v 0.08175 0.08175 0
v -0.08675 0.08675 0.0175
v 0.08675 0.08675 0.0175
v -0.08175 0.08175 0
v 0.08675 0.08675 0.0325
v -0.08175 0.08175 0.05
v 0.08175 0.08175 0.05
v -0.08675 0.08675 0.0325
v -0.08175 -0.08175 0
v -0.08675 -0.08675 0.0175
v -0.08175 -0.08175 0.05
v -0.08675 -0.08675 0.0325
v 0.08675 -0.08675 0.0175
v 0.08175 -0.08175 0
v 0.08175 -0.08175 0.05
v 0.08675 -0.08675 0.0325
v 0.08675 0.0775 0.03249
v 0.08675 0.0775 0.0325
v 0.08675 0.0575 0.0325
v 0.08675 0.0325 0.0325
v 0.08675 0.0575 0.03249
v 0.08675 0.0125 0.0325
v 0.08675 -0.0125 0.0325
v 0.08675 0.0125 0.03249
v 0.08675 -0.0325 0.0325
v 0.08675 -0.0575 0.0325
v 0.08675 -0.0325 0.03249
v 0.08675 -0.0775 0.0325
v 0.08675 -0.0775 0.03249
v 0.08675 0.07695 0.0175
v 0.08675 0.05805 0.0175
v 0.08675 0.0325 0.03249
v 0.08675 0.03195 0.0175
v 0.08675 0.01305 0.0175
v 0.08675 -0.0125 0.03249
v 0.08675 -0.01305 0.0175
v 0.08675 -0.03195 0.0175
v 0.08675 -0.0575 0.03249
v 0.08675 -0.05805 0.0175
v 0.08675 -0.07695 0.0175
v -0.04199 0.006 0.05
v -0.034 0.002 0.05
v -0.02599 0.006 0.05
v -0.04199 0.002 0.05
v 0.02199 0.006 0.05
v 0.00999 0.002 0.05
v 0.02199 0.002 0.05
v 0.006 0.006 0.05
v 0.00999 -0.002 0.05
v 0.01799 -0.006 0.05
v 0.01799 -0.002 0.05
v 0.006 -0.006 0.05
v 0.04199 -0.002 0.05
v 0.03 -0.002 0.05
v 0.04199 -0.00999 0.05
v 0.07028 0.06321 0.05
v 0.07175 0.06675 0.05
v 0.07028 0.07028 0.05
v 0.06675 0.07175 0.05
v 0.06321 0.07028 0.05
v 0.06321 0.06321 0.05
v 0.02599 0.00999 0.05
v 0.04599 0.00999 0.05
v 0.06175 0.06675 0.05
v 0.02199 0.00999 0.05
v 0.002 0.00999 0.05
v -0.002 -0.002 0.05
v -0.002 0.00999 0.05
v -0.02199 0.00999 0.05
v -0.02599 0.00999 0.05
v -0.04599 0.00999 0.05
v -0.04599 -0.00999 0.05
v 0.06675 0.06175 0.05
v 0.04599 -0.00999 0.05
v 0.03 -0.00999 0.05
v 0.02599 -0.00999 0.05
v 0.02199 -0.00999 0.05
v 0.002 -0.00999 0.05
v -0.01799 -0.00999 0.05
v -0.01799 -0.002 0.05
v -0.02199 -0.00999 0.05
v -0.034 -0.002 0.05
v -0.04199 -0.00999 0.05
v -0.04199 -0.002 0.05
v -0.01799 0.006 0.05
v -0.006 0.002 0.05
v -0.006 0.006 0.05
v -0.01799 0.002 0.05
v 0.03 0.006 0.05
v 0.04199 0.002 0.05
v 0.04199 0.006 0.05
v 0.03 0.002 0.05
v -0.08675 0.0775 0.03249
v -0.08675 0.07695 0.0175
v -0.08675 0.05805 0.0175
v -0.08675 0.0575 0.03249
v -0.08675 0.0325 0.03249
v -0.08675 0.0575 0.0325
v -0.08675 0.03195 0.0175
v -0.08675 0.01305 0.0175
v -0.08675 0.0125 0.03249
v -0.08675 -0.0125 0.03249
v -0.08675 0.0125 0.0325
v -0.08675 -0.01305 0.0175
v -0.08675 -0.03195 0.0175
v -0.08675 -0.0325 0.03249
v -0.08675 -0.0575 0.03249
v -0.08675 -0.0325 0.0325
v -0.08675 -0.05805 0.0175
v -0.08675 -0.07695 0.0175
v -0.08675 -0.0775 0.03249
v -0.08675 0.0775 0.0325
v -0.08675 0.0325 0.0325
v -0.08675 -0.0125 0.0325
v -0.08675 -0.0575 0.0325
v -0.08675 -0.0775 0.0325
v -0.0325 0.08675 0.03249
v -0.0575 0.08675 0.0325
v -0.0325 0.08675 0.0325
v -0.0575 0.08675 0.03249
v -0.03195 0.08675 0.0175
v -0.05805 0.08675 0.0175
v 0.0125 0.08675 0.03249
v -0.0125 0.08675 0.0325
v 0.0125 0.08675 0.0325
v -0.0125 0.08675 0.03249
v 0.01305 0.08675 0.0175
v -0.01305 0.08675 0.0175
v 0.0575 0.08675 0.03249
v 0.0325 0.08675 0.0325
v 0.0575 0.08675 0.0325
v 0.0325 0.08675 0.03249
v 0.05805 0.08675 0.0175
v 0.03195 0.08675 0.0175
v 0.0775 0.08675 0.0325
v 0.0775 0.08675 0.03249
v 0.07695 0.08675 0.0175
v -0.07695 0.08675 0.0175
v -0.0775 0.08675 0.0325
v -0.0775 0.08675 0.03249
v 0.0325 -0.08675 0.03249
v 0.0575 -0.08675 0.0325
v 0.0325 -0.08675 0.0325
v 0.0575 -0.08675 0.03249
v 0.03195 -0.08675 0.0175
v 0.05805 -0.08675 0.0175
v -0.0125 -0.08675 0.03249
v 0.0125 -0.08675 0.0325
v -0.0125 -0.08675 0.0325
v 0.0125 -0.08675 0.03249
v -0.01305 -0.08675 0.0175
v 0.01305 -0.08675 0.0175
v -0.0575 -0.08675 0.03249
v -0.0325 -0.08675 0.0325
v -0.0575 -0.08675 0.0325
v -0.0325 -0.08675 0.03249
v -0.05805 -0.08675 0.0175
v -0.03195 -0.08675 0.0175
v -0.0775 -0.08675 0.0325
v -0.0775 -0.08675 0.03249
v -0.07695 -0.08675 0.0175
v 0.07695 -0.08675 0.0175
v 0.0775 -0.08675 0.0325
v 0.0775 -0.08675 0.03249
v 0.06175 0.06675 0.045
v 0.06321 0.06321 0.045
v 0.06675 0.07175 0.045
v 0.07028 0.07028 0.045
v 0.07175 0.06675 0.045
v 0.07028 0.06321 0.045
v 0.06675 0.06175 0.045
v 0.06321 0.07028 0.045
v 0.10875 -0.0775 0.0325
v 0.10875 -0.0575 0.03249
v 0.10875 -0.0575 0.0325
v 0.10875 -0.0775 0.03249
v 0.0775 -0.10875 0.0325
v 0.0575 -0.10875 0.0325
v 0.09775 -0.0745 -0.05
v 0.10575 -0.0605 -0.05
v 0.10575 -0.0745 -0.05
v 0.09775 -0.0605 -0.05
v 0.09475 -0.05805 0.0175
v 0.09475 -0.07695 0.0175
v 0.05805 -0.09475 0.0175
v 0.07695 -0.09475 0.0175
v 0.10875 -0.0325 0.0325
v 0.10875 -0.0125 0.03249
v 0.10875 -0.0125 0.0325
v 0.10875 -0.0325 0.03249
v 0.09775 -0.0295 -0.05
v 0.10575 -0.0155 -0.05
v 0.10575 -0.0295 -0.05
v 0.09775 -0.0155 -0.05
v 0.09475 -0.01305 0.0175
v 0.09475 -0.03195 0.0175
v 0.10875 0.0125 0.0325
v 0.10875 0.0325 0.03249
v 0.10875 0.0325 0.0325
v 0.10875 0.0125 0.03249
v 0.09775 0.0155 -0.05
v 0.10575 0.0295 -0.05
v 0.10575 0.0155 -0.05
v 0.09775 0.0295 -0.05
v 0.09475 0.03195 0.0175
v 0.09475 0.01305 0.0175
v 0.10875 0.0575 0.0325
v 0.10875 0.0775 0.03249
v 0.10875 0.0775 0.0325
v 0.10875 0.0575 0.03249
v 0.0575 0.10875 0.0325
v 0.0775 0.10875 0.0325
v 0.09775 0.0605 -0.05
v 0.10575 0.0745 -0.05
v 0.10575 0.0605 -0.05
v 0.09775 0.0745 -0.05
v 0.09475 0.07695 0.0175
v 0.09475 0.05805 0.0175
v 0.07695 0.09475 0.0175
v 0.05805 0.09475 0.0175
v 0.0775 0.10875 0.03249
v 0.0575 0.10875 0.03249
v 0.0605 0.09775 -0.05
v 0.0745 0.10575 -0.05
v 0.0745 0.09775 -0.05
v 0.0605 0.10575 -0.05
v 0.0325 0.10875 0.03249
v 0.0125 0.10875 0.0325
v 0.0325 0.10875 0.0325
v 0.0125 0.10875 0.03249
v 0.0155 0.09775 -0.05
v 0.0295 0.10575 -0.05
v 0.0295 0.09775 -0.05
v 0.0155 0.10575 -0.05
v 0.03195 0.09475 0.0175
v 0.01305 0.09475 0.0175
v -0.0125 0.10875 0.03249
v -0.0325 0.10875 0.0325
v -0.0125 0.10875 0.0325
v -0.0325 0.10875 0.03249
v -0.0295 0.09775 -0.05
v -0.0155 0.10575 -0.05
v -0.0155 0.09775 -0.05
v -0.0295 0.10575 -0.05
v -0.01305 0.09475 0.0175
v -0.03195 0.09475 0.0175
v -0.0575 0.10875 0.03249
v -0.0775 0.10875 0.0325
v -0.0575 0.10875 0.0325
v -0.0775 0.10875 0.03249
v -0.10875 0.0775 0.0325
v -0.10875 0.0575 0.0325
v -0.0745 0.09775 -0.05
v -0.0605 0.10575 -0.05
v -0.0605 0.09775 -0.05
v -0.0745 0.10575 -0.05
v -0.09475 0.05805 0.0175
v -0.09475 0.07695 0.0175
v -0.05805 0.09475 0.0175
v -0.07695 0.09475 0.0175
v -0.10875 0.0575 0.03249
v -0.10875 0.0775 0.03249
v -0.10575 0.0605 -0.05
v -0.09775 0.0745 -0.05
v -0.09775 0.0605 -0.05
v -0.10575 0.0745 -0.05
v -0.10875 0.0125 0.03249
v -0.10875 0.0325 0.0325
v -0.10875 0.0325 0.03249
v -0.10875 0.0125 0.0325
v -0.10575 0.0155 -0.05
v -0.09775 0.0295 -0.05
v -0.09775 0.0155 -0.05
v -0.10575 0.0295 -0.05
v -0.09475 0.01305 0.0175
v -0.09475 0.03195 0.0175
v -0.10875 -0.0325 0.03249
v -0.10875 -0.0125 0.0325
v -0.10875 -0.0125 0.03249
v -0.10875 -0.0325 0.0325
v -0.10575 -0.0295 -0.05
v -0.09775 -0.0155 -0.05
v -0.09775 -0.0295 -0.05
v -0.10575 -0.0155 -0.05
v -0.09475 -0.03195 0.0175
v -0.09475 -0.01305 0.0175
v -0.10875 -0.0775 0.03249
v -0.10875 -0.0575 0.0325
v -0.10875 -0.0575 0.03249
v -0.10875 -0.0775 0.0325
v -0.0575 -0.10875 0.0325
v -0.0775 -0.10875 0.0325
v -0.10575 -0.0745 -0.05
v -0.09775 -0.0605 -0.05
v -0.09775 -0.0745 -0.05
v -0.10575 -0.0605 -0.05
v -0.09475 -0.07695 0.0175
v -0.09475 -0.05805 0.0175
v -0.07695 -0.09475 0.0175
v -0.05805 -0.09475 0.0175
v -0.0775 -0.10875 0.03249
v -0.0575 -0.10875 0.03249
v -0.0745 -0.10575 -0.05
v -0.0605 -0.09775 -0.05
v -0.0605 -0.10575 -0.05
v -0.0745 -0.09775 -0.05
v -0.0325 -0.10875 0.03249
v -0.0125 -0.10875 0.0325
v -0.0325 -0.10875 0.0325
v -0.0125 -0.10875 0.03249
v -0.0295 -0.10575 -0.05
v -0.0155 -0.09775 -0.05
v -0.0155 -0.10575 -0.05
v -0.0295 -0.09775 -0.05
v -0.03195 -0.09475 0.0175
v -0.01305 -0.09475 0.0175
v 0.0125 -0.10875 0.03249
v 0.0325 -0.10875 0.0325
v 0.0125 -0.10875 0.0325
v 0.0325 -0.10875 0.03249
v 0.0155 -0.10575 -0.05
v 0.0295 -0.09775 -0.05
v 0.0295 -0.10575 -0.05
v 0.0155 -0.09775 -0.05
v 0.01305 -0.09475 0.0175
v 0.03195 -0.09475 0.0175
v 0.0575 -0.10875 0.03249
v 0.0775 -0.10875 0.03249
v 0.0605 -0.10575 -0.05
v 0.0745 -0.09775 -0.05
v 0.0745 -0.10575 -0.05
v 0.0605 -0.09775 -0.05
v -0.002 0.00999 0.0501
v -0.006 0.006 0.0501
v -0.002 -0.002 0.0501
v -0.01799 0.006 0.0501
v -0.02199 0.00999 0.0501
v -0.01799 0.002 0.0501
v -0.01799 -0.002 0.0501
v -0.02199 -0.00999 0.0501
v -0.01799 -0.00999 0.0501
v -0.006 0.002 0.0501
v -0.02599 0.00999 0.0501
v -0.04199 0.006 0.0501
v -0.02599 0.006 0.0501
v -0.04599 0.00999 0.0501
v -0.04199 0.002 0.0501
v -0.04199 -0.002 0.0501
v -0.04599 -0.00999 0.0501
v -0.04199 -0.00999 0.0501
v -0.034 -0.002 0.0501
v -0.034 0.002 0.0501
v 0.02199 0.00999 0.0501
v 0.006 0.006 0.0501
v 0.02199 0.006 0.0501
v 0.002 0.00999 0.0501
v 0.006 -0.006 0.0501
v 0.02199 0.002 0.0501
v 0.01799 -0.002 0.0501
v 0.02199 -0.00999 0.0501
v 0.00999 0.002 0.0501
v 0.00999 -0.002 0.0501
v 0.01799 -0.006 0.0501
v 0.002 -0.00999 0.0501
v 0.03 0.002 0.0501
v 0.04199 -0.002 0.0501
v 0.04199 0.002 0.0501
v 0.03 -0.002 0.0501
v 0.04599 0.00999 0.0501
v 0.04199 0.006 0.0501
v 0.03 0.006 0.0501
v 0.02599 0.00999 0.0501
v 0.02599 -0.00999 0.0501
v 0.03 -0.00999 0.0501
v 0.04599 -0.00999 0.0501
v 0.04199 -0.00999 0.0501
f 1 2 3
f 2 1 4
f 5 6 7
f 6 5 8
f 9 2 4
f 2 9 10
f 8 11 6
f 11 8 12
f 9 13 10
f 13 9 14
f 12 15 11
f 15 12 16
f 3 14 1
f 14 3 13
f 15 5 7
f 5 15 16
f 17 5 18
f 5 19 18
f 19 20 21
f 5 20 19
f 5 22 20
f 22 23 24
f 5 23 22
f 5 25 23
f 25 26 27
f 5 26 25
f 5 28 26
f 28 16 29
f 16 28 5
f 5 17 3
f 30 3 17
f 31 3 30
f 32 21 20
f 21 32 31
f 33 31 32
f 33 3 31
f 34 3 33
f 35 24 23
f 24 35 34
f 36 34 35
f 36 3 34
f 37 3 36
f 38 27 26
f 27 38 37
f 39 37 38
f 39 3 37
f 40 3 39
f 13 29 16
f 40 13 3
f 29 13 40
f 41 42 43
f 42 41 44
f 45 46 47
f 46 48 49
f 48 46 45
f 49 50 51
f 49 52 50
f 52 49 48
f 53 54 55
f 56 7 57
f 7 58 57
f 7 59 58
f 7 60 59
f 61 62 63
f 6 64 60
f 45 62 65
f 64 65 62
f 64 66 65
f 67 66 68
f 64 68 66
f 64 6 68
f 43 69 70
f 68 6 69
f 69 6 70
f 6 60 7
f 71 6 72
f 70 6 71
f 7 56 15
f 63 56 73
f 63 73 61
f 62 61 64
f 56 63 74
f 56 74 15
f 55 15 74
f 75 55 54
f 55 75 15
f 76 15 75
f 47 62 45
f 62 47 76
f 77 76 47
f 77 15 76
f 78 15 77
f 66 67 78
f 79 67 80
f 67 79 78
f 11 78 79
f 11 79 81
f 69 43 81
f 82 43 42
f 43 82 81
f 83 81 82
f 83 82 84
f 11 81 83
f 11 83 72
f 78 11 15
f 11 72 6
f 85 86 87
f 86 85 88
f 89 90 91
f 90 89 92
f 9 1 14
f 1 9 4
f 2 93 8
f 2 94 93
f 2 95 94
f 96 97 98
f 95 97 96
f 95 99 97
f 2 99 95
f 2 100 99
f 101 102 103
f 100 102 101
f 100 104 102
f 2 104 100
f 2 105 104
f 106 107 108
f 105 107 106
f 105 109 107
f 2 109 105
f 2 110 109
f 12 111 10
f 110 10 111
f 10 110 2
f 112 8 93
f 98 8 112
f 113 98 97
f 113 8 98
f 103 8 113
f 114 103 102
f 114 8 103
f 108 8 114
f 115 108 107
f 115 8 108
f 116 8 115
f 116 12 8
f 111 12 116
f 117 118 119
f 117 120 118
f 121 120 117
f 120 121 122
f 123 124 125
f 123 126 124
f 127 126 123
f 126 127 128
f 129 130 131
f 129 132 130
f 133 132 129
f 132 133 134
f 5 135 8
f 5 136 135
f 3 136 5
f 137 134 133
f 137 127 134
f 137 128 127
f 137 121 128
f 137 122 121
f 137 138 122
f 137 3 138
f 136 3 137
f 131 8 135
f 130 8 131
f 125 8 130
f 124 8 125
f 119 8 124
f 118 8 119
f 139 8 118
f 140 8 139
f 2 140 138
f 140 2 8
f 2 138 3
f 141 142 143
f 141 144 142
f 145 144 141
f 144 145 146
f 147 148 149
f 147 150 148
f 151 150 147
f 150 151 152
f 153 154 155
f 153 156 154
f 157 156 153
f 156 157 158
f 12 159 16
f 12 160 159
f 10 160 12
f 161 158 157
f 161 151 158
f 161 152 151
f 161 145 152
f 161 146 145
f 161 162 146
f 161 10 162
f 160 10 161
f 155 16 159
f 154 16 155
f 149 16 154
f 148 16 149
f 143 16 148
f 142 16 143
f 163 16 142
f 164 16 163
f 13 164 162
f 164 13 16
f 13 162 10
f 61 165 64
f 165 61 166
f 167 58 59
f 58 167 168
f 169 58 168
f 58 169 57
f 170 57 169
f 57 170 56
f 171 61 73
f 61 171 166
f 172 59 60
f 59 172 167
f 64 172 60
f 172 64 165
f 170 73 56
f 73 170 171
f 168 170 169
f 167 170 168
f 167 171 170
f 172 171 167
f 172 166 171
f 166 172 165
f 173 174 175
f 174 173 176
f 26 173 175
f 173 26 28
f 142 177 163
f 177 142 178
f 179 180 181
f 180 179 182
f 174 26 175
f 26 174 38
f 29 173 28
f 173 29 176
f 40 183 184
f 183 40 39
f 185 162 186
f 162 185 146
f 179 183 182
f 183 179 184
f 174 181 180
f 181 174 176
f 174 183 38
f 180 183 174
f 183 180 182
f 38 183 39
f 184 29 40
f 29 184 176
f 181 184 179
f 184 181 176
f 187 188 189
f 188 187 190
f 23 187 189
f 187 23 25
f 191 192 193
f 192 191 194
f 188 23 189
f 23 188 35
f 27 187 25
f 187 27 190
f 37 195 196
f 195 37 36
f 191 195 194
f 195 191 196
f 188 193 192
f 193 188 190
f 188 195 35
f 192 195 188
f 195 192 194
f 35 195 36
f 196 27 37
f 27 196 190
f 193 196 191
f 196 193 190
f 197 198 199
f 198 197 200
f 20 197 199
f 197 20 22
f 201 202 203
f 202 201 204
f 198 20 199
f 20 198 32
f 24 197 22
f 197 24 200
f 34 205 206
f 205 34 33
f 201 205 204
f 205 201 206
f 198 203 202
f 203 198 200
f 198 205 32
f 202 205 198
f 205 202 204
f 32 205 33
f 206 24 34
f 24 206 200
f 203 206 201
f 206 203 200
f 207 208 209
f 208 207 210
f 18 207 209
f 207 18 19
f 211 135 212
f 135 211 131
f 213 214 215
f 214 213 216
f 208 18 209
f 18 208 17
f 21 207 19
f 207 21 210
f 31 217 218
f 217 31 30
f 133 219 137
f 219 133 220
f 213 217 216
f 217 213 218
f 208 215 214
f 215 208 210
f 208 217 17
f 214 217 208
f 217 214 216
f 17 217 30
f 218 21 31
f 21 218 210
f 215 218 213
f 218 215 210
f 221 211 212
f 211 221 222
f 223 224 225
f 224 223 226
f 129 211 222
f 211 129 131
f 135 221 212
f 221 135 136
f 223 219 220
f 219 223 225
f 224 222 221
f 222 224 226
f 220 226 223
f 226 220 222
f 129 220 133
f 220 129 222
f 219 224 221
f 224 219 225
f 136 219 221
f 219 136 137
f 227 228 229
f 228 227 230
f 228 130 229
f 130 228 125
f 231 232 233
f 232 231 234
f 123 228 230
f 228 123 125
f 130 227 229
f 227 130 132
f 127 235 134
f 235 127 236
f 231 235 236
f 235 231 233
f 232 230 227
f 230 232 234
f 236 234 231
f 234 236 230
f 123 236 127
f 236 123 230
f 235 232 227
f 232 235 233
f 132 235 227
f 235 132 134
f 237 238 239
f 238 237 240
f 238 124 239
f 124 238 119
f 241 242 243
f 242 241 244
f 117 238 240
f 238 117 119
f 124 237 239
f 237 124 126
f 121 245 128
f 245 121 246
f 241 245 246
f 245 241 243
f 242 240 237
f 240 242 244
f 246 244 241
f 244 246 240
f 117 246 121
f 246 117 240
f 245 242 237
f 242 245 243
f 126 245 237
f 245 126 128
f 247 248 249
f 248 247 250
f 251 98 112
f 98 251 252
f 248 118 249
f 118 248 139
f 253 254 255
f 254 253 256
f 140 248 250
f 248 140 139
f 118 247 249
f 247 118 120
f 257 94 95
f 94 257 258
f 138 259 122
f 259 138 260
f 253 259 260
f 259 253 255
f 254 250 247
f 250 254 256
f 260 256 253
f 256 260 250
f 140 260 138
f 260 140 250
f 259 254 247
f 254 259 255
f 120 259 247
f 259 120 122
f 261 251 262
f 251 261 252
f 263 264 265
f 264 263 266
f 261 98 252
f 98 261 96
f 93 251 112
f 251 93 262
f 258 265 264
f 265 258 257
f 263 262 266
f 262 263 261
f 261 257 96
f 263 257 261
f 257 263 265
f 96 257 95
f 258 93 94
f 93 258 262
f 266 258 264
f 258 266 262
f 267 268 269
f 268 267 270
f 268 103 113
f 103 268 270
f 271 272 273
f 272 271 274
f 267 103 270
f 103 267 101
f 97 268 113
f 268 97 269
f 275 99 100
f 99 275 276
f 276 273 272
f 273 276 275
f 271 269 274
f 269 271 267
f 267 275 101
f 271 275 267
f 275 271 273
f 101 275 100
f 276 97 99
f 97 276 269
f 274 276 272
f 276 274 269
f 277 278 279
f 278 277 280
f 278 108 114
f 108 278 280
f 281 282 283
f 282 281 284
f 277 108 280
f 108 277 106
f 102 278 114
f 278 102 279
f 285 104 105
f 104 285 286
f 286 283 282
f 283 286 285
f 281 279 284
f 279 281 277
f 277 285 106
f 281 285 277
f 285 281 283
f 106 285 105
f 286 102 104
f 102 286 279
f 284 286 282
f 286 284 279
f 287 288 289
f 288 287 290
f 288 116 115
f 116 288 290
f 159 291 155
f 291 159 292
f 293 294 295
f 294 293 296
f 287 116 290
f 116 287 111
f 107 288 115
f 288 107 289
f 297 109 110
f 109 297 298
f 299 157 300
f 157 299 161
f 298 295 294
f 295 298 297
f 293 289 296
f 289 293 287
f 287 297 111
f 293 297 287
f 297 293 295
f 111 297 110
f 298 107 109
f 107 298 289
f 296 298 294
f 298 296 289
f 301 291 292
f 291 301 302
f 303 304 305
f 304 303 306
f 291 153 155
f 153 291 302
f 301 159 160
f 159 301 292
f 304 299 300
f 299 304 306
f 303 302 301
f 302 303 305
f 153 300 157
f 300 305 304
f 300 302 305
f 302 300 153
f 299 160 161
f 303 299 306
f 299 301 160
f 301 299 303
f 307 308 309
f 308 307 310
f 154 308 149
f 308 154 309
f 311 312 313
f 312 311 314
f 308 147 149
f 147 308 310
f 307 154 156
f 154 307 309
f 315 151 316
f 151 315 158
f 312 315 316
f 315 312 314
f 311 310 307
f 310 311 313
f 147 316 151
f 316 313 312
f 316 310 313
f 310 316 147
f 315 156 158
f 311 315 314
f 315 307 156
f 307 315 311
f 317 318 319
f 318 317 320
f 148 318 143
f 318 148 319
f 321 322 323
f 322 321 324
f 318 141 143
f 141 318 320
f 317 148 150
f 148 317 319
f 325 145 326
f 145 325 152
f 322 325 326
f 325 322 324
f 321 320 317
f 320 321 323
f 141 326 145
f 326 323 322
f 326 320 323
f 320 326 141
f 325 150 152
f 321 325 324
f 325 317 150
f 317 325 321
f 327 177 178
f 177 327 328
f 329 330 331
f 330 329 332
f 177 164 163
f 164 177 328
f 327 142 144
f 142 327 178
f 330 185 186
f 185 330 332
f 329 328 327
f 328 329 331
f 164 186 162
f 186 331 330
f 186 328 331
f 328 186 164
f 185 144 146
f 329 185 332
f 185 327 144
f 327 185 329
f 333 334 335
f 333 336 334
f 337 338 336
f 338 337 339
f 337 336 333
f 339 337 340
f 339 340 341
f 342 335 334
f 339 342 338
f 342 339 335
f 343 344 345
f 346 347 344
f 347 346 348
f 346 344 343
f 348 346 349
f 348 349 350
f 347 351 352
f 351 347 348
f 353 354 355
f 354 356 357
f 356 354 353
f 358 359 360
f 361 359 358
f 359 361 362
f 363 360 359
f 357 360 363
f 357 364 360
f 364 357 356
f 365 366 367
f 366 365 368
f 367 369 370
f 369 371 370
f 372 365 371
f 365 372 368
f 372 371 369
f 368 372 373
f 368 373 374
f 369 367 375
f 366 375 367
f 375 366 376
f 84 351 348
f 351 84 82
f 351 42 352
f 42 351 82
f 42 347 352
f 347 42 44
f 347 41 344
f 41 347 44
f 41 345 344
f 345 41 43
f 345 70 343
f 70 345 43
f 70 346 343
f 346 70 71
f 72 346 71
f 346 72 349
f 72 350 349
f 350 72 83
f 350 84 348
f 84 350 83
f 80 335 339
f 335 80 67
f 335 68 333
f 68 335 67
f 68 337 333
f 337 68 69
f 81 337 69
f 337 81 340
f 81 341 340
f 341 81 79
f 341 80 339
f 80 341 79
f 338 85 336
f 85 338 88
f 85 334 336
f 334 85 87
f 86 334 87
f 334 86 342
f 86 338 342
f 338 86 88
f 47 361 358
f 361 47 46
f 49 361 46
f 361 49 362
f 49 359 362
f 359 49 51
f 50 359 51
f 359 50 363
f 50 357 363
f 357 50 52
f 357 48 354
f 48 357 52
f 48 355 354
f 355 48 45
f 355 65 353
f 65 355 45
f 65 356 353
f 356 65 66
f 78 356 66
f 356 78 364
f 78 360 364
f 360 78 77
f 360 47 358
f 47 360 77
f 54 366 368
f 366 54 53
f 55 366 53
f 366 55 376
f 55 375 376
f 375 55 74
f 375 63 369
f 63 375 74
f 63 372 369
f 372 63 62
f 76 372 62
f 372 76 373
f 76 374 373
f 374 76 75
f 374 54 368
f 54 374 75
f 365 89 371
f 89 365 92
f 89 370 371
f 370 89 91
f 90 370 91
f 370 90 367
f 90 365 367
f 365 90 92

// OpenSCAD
// file: Text_FPGALOGIC.scad
include <Text_shared.scad>;

module Text_FPGALOGIC() {
  Text("FPGA LOGIC");
}

Text_FPGALOGIC();
// file: DataSymbol.scad
boxSize = 0.029;
lineSize = 0.0045;
symDepth = 0.01;
vertSeparation = 0.019;
horizSeparation = 0.018;

module DataSymbol() {
  boxVertCenter = (boxSize+vertSeparation)/2;
  boxHorizCenter = (boxSize+horizSeparation)/2;
  linear_extrude(symDepth, center=true) {
    translate([0,boxVertCenter]) square(boxSize, center=true); // top box
    translate([-boxHorizCenter,-boxVertCenter]) square(boxSize, center=true); // bottom left box
    translate([boxHorizCenter,-boxVertCenter]) square(boxSize, center=true); // bottom right box
    square([2*boxHorizCenter + lineSize, lineSize], center=true); // middle line
    translate([0, horizSeparation/4]) square([lineSize, horizSeparation/2 + lineSize], center=true); // line to top
    translate([-boxHorizCenter, -horizSeparation/4]) square([lineSize, horizSeparation/2 + lineSize], center=true); // line to bottom left
    translate([boxHorizCenter, -horizSeparation/4]) square([lineSize, horizSeparation/2 + lineSize], center=true); // line to bottom right
  }
}

DataSymbol();
// file: PowerSymbol.scad
symWidth = 0.038;
symHeight = 0.086;
symDepth = 0.01;
middleHeight = 0.0075;
topHorizOffset = 0.007;
sideVertOffset = 0.007;

module PowerSymbol() {
  linear_extrude(symDepth, center=true) {
    halfHei = symHeight/2;
    halfWid = symWidth/2;
    halfMid = middleHeight/2;
    polygon([
      [topHorizOffset, halfHei],
      [0, halfMid],
      [halfWid, sideVertOffset],
      [-topHorizOffset, -halfHei],
      [0, -halfMid],
      [-halfWid, -sideVertOffset]
    ]);
  }
}

PowerSymbol();
// file: BasicFPGAHousing_pins.scad
include <FPGA_shared.scad>;
use <BasicFPGAHousing_base.scad>;
use <BasicFPGAHousing_paintcap.scad>;

module BasicFPGAHousing_pins() {
  pinStartOffset = -(decoPinCount+1)/2 * decoPinSpacing;
  bevelSize = decoPinBevelSize * sqrt(2);

  for (edge=[0:3]) rotate([0,0,90*edge]) {
    for (pin=[1:decoPinCount]) translate([capSize/2, pinStartOffset+pin*decoPinSpacing, baseTop]) {
      difference() {
        cube(size=[decoPinLength*2, decoPinWidth, decoPinHeight*2], center=true);
        translate([decoPinLength,0,decoPinHeight]) rotate([0,45,0]) {
          cube(size=[bevelSize,decoPinWidth*2,bevelSize],center=true);
        }
      }
    }
  }
}

BasicFPGAHousing_pins();
%BasicFPGAHousing_base();
%BasicFPGAHousing_paintcap();
// file: BasicFPGAHousing_paintcap.scad
include <FPGA_shared.scad>;
use <BasicFPGAHousing_base.scad>;

module BasicFPGAHousing_paintcap() {
  bevelDepth = capBevel * sqrt(2);
  difference() {
    translate([0,0,baseTop]) {
      cube(size=[capSize, capSize, capDepth*2], center=true);
    }
    cube(size=[slotSize+eps, slotSize+eps, smallGridSize], center=true);
    for (edge=[1:4]) rotate([0,0,90*edge]) {
      translate([0,capSize/2,baseTop+capDepth]) rotate([45,0,0])
        cube(size=[capSize+0.1, bevelDepth, bevelDepth*2], center=true);
    }
  }
}

%BasicFPGAHousing_base();
BasicFPGAHousing_paintcap();
// file: BasicFPGAHousing_base.scad
include <FPGA_shared.scad>;
use <BasicFPGAHousing_paintcap.scad>;
use <PowerSymbol.scad>;
use <DataSymbol.scad>;

module BasicFPGAHousing_chipcutout() {
  slotPinBaseOffset = (-slotPinEdgeCount-1)/2 * slotPinEdgeSpacing;
  slotPinEdgeOffset = slotSize/2 - slotPinSize/2 - slotPinEdgePad;
  union() {
    translate([0, 0, baseDepth/2 + slotBottom + slotPinDepth]) {
      cube(size=[slotSize, slotSize, baseDepth], center=true);
    }
    for(edge=[1:4]) rotate([0,0,90*edge]) {
      for(i=[1:slotPinEdgeCount]) {
        translate([
          slotPinBaseOffset + slotPinEdgeSpacing*i,
          slotPinEdgeOffset,
          slotBottom + slotPinDepth
        ]) {
          cube(size=[slotPinSize, slotPinSize, slotPinDepth*2], center=true);
        }
      }
    }
    translate([alignHoleOffset,alignHoleOffset,slotBottom + slotPinDepth])
      cylinder(h=alignHoleDepth*2, r=alignHoleRadius, center=true, $fn=alignHoleSides);
  }
}

module BasicFPGAHousing_base() {
  middleSize = (slotSize + capSize) / 2;
  difference() {
    union() {
      translate([0,0,baseCenter])
        cube(size=[baseSize, baseSize, baseDepth], center=true);
      translate([0,0,baseTop-eps])
        cube(size=[middleSize, middleSize, capDepth*2], center=true);
    }
    translate([0,0,baseBottom])
      cube(size=[baseBackCutoutSize, baseBackCutoutSize, baseBackCutoutDepth*2], center=true);
    BasicFPGAHousing_chipcutout();
  }
}

BasicFPGAHousing_base();
%BasicFPGAHousing_paintcap();
// file: Text_shared.scad
char_depth = 0.0001;

char_pixelsz = 0.02/5;
char_pheight = 5;
char_max_pwidth = 5;

function sum(list) = list * [for (_=list) 1];
function partialsum(list, end) = list * [for (i=[0:len(list)-1]) i < end ? 1 : 0];

module _Text_Line(a, b) {
  l = norm(b-a);
  f = l > 0 ? (b-a)/l : [1, 0];
  r = [f.y, -f.x];
  ea = -0.5*f;
  eb = (l+0.5)*f;
  sr = 0.5*r;
  sl = -sr;
  polygon([
    a+ea+sr,
    a+eb+sr,
    a+eb+sl,
    a+ea+sl,
  ]*char_pixelsz);
}

module _Text_Segments(pts, off=[0,0]) {
  for (i=[0:len(pts)-2]) {
    pa = pts[i];
    pb = pts[i+1];
    if (len(pa) == 2 && len(pb) == 2)
      _Text_Line(pts[i]+off, pts[i+1]+off);
  }
}

_Letters = [
  [[-2, -2], [-2, 2], [2, 2], [2, -2], [2, 0], [-2, 0]], // A
  [], // B
  [[2, -2], [-2, -2], [-2, 2], [2, 2]], // C
  [[2, 0.5], [2, -2], [-2, -2], [-2, 2], [0.5, 2], [], [3, 0], [0, 3]], // D
  [[2, -2], [-2, -2], [-2, 2], [2, 2], [], [-2, 0], [0, 0]], // E
  [[2, 2], [-2, 2], [-2, -2], [-2, 0], [0, 0]], // F
  [[0, 0], [2, 0], [2, -2], [-2, -2], [-2, 2], [2, 2]], // G
  [], // H
  [[0, -2], [0, 2]], // I
  [], // J
  [], // K
  [[-2, 2], [-2, -2], [2, -2]], // L
  [], // M
  [], // N
  [[-2, -2], [-2, 2], [2, 2], [2, -2], [-2, -2]], // O
  [[-2, -2], [-2, 2], [2, 2], [2, 0], [-2, 0]], // P
  [], // Q
  [[-2, -2], [-2, 2], [2, 2], [2, 0], [-2, 0], [1, -3]], // R
  [], // S
  [], // T
  [], // U
  [], // V
  [], // W
  [], // X
  [], // Y
  [], // Z
  [[-2, 2], [2, 2], [2, 0], [0, 0], [], [0, -2], [0, -2]], // ? for missing
];

function _Letter_Lookup(c) =
  let(
    ci=ord(c),
    li=ci-ord("A"),
    issp=ci==32,
    lps=li>=0&&li<26 ? _Letters[li] : [],
    lpf=len(lps)==0 ? _Letters[26] : lps
  ) issp ? [] : lpf;

function _Letter_Bounds(letter) =
  let(
    fletter = concat([[0, 0]], [for (l=letter) len(l)==2 ? l : [0,0]]),
    xs = [for (l=fletter) l.x],
    ys = [for (l=fletter) l.y]
  ) [min(xs), min(ys), max(xs), max(ys)];

module Text(letters) {
  lbounds = [for (l=letters) _Letter_Bounds(l)];
  lwidths = [for (b=lbounds) min(b.z-b.x+1, char_max_pwidth)];
  lmins = [for (b=lbounds) b.x];
  twid = sum(lwidths) + len(letters)-1;
  startoff = (1-twid)/2;
  offs = [for (i=[0:len(letters)-1]) startoff+i+partialsum(lwidths, i)];
  linear_extrude(height=char_depth) {
    for (i=[0:len(letters)-1]) if (len(letters[i]) > 0) {
      letter = letters[i];
      off = offs[i];
      left = off-lmins[i];
      wid = lwidths[i];
      intersection() {
        _Text_Segments(letter, [left, 0]);
        scale([char_pixelsz,char_pixelsz]) translate([off-0.5, -char_pheight/2])
          square(size=[wid, char_pheight]);
      }
    }
  }
}

module Text(text) {
  letters = [for (c=text) _Letter_Lookup(c)];
  lbounds = [for (l=letters) _Letter_Bounds(l)];
  lwidths = [for (b=lbounds) min(b.z-b.x+1, char_max_pwidth)];
  lmins = [for (b=lbounds) b.x];
  twid = sum(lwidths) + len(letters)-1;
  startoff = (1-twid)/2;
  offs = [for (i=[0:len(letters)-1]) startoff+i+partialsum(lwidths, i)];
  linear_extrude(height=char_depth) {
    for (i=[0:len(letters)-1]) if (len(letters[i]) > 0) {
      letter = letters[i];
      off = offs[i];
      left = off-lmins[i];
      wid = lwidths[i];
      intersection() {
        _Text_Segments(letter, [left, 0]);
        scale([char_pixelsz,char_pixelsz]) translate([off-0.5, -char_pheight/2])
          square(size=[wid, char_pheight]);
      }
    }
  }
}
// file: BasicFPGAHousing_full.scad
use <BasicFPGAHousing_base.scad>;
use <BasicFPGAHousing_paintcap.scad>;
use <BasicFPGAHousing_pins.scad>;
use <PowerSymbol.scad>;
use <DataSymbol.scad>;
use <Text_FPGALOGIC.scad>;

module BasicFPGAHousing_full() {
  color("#444") BasicFPGAHousing_base();
  color("#444") BasicFPGAHousing_paintcap();
  color("#FFF") BasicFPGAHousing_pins();
  color("#F00") translate([0.067,0.25,-0.001]) rotate([-90, 0, 0]) PowerSymbol();
  color("#0F0") translate([0.073,-0.25,0.001]) rotate([90, 0, 0]) DataSymbol();
  color("#FFF") translate([0,0.16,0.095]) Text_FPGALOGIC();
}

BasicFPGAHousing_full();
// file: Text_FPGA.scad
include <Text_shared.scad>;

module Text_FPGA() {
  Text("FPGA");
}

Text_FPGA();
// file: BasicFPGAChip_pins.scad
include <FPGA_shared.scad>;
use <BasicFPGAChip_base.scad>;

module FPGAPin() {
  pinTop = chipTotalHeight/2 - chipBaseHeight/2 + pinHorizHeight/2;
  pinVCenter = pinTop - pinTotalHeight/2;
  pinBottomInnerEdge = pinHorizUnderLength + pinVertInnerOffset;
  pinInnerHeight = pinTotalHeight - pinHorizHeight;
  pinInnerAngle = atan2(-pinVertInnerOffset, pinInnerHeight);
  pinInnerCutoutHeight = pinInnerHeight / cos(pinInnerAngle);
  pinBottomOuterEdge = pinHorizLength - pinVertOuterOffset;
  pinOuterAngle = atan2(pinVertOuterOffset, pinTotalHeight);
  pinBottomNarrowEdge = pinHorizWidth/2 - pinVertNarrowOffset;
  pinNarrowAngle = atan2(pinVertNarrowOffset, pinTotalHeight);
  translate([0,0,pinVCenter]) difference() {
    translate([0, 0, 0])
      cube(size=[pinHorizLength*2, pinHorizWidth, pinTotalHeight], center=true);
    translate([pinHorizUnderLength-pinHorizLength, 0, -pinHorizHeight])
      cube(size=[pinHorizLength*2, pinHorizWidth*2, pinTotalHeight], center=true);
    translate([pinBottomInnerEdge,0,-pinHorizHeight/2-pinInnerHeight/2])
      rotate([0,pinInnerAngle,0])
      translate([-pinVertInnerOffset,0,0])
        cube(size=[pinVertInnerOffset*2, pinHorizWidth*2, pinInnerCutoutHeight*2], center=true);
    translate([pinBottomOuterEdge,0,-pinTotalHeight/2])
      rotate([0,pinOuterAngle,0])
      translate([pinVertOuterOffset,0,0])
        cube(size=[pinVertOuterOffset*2, pinHorizWidth*2, pinTotalHeight*4], center=true);
    translate([0,pinBottomNarrowEdge,-pinTotalHeight/2])
      rotate([-pinNarrowAngle,0,0])
      translate([0,pinVertNarrowOffset,0])
        cube(size=[pinHorizLength*4,pinVertNarrowOffset*2, pinTotalHeight*4], center=true);
    translate([0,-pinBottomNarrowEdge,-pinTotalHeight/2])
      rotate([pinNarrowAngle,0,0])
      translate([0,-pinVertNarrowOffset,0])
        cube(size=[pinHorizLength*4,pinVertNarrowOffset*2, pinTotalHeight*4], center=true);
  }
}

module BasicFPGAChip_pins() {
  for (edge=[0:3])
    for (off=[1:slotPinEdgeCount])
      rotate([0,0,90*edge])
        translate([chipBaseSize/2, slotPinEdgeSpacing * (off - (slotPinEdgeCount+1)/2), 0])
        FPGAPin();
}

BasicFPGAChip_pins();
%BasicFPGAChip_base();
// file: BasicFPGAChip_base.scad
include <FPGA_shared.scad>;
use <BasicFPGAHousing_full.scad>;
use <BasicFPGAChip_pins.scad>;
use <Text_FPGA.scad>;

module BasicFPGAChip_base() {
  bevelHeight = (chipBaseHeight - pinHorizHeight)/2;
  bevelAngle = atan2(chipBaseBevelSize, bevelHeight);
  translate([0, 0, chipTotalHeight/2 - chipBaseHeight/2]) difference() {
    cube(size=[chipBaseSize, chipBaseSize, chipBaseHeight], center=true);
    for (side=[0:3]) rotate([0,0,90*side])
      for (vside = [-1:2:1])
        translate([0,chipBaseSize/2,vside*pinHorizHeight/2])
          rotate([vside*bevelAngle,0,0])
          translate([0,chipBaseBevelSize,0])
            cube(size=[chipBaseSize*2,chipBaseBevelSize*2,bevelHeight*4], center=true);
    translate([alignHoleOffset,alignHoleOffset,chipBaseHeight/2])
      cylinder(h=alignHoleDepth*2, r=alignHoleRadius, center=true, $fn=alignHoleSides);
  }
}

BasicFPGAChip_base();
%BasicFPGAChip_pins();
%translate([0,0,0.05]) Text_FPGA();
*%translate([0,0,-slotBottom-chipTotalHeight/2]) BasicFPGAHousing_full();
// file: FPGA_shared.scad
smallGridSize = 0.5;
baseSize = smallGridSize;
baseTop = 0.05;
baseBottom = -0.045;
baseDepth = baseTop - baseBottom;
baseCenter = (baseTop + baseBottom)/2;
baseBackRim = 0.02;
baseBackCutoutSize = baseSize - baseBackRim*2;
baseBackCutoutDepth = 0.01;
capSize = 0.41;
capDepth = 0.045;
capBevel = 0.01;
slotSize = smallGridSize * 0.5;
slotBottom = 0.03;
slotPinEdgeCount = 4;
slotPinEdgePad = 0.01;
slotPinEdgeSpacing = 0.045;
slotPinSize = 0.025;
slotPinDepth = 0.025;
eps = 0.00001;
chipTotalSize = slotSize - slotPinEdgePad*2 - slotPinSize/2;
chipTotalHeight = 0.1;
chipBaseHeight = 0.05;
pinHorizLength = 0.022;
pinHorizUnderLength = 0.008;
pinHorizWidth = 0.02;
pinHorizHeight = 0.015;
pinVertInnerOffset = 0.003;
pinVertOuterOffset = 0.003;
pinVertNarrowOffset = 0.003;
pinTotalHeight = chipTotalHeight - chipBaseHeight/2 + pinHorizHeight/2;
chipBaseSize = chipTotalSize - pinHorizLength*2;
chipBaseBevelSize = 0.005;
alignHoleRadius = 0.005;
alignHoleOffset = chipBaseSize/2 - 0.02;
alignHoleDepth = 0.005;
alignHoleSides = 8;
decoPinCount = 8;
decoPinWidth = 0.036;
decoPinLength = 0.034;
decoPinHeight = 0.028;
decoPinSpacing = 0.049;
decoPinBevelSize = 0.010;

module cablecutout() {
  cableradius = 0.025;
  cableDepth = 0.0125;
  translate([0,smallGridSize/2,0]) rotate([90,0,0]) {
    cylinder(h=cableDepth*2, r=cableradius, center=true, $fn=8);
  }
}
// main file
include <FPGA_shared.scad>;
use <BasicFPGAChip_base.scad>;
use <BasicFPGAChip_pins.scad>;
use <Text_FPGA.scad>;

color("#111") BasicFPGAChip_base();
color("#DDD") BasicFPGAChip_pins();
color("#FFF") translate([0,0,0.05]) Text_FPGA();
